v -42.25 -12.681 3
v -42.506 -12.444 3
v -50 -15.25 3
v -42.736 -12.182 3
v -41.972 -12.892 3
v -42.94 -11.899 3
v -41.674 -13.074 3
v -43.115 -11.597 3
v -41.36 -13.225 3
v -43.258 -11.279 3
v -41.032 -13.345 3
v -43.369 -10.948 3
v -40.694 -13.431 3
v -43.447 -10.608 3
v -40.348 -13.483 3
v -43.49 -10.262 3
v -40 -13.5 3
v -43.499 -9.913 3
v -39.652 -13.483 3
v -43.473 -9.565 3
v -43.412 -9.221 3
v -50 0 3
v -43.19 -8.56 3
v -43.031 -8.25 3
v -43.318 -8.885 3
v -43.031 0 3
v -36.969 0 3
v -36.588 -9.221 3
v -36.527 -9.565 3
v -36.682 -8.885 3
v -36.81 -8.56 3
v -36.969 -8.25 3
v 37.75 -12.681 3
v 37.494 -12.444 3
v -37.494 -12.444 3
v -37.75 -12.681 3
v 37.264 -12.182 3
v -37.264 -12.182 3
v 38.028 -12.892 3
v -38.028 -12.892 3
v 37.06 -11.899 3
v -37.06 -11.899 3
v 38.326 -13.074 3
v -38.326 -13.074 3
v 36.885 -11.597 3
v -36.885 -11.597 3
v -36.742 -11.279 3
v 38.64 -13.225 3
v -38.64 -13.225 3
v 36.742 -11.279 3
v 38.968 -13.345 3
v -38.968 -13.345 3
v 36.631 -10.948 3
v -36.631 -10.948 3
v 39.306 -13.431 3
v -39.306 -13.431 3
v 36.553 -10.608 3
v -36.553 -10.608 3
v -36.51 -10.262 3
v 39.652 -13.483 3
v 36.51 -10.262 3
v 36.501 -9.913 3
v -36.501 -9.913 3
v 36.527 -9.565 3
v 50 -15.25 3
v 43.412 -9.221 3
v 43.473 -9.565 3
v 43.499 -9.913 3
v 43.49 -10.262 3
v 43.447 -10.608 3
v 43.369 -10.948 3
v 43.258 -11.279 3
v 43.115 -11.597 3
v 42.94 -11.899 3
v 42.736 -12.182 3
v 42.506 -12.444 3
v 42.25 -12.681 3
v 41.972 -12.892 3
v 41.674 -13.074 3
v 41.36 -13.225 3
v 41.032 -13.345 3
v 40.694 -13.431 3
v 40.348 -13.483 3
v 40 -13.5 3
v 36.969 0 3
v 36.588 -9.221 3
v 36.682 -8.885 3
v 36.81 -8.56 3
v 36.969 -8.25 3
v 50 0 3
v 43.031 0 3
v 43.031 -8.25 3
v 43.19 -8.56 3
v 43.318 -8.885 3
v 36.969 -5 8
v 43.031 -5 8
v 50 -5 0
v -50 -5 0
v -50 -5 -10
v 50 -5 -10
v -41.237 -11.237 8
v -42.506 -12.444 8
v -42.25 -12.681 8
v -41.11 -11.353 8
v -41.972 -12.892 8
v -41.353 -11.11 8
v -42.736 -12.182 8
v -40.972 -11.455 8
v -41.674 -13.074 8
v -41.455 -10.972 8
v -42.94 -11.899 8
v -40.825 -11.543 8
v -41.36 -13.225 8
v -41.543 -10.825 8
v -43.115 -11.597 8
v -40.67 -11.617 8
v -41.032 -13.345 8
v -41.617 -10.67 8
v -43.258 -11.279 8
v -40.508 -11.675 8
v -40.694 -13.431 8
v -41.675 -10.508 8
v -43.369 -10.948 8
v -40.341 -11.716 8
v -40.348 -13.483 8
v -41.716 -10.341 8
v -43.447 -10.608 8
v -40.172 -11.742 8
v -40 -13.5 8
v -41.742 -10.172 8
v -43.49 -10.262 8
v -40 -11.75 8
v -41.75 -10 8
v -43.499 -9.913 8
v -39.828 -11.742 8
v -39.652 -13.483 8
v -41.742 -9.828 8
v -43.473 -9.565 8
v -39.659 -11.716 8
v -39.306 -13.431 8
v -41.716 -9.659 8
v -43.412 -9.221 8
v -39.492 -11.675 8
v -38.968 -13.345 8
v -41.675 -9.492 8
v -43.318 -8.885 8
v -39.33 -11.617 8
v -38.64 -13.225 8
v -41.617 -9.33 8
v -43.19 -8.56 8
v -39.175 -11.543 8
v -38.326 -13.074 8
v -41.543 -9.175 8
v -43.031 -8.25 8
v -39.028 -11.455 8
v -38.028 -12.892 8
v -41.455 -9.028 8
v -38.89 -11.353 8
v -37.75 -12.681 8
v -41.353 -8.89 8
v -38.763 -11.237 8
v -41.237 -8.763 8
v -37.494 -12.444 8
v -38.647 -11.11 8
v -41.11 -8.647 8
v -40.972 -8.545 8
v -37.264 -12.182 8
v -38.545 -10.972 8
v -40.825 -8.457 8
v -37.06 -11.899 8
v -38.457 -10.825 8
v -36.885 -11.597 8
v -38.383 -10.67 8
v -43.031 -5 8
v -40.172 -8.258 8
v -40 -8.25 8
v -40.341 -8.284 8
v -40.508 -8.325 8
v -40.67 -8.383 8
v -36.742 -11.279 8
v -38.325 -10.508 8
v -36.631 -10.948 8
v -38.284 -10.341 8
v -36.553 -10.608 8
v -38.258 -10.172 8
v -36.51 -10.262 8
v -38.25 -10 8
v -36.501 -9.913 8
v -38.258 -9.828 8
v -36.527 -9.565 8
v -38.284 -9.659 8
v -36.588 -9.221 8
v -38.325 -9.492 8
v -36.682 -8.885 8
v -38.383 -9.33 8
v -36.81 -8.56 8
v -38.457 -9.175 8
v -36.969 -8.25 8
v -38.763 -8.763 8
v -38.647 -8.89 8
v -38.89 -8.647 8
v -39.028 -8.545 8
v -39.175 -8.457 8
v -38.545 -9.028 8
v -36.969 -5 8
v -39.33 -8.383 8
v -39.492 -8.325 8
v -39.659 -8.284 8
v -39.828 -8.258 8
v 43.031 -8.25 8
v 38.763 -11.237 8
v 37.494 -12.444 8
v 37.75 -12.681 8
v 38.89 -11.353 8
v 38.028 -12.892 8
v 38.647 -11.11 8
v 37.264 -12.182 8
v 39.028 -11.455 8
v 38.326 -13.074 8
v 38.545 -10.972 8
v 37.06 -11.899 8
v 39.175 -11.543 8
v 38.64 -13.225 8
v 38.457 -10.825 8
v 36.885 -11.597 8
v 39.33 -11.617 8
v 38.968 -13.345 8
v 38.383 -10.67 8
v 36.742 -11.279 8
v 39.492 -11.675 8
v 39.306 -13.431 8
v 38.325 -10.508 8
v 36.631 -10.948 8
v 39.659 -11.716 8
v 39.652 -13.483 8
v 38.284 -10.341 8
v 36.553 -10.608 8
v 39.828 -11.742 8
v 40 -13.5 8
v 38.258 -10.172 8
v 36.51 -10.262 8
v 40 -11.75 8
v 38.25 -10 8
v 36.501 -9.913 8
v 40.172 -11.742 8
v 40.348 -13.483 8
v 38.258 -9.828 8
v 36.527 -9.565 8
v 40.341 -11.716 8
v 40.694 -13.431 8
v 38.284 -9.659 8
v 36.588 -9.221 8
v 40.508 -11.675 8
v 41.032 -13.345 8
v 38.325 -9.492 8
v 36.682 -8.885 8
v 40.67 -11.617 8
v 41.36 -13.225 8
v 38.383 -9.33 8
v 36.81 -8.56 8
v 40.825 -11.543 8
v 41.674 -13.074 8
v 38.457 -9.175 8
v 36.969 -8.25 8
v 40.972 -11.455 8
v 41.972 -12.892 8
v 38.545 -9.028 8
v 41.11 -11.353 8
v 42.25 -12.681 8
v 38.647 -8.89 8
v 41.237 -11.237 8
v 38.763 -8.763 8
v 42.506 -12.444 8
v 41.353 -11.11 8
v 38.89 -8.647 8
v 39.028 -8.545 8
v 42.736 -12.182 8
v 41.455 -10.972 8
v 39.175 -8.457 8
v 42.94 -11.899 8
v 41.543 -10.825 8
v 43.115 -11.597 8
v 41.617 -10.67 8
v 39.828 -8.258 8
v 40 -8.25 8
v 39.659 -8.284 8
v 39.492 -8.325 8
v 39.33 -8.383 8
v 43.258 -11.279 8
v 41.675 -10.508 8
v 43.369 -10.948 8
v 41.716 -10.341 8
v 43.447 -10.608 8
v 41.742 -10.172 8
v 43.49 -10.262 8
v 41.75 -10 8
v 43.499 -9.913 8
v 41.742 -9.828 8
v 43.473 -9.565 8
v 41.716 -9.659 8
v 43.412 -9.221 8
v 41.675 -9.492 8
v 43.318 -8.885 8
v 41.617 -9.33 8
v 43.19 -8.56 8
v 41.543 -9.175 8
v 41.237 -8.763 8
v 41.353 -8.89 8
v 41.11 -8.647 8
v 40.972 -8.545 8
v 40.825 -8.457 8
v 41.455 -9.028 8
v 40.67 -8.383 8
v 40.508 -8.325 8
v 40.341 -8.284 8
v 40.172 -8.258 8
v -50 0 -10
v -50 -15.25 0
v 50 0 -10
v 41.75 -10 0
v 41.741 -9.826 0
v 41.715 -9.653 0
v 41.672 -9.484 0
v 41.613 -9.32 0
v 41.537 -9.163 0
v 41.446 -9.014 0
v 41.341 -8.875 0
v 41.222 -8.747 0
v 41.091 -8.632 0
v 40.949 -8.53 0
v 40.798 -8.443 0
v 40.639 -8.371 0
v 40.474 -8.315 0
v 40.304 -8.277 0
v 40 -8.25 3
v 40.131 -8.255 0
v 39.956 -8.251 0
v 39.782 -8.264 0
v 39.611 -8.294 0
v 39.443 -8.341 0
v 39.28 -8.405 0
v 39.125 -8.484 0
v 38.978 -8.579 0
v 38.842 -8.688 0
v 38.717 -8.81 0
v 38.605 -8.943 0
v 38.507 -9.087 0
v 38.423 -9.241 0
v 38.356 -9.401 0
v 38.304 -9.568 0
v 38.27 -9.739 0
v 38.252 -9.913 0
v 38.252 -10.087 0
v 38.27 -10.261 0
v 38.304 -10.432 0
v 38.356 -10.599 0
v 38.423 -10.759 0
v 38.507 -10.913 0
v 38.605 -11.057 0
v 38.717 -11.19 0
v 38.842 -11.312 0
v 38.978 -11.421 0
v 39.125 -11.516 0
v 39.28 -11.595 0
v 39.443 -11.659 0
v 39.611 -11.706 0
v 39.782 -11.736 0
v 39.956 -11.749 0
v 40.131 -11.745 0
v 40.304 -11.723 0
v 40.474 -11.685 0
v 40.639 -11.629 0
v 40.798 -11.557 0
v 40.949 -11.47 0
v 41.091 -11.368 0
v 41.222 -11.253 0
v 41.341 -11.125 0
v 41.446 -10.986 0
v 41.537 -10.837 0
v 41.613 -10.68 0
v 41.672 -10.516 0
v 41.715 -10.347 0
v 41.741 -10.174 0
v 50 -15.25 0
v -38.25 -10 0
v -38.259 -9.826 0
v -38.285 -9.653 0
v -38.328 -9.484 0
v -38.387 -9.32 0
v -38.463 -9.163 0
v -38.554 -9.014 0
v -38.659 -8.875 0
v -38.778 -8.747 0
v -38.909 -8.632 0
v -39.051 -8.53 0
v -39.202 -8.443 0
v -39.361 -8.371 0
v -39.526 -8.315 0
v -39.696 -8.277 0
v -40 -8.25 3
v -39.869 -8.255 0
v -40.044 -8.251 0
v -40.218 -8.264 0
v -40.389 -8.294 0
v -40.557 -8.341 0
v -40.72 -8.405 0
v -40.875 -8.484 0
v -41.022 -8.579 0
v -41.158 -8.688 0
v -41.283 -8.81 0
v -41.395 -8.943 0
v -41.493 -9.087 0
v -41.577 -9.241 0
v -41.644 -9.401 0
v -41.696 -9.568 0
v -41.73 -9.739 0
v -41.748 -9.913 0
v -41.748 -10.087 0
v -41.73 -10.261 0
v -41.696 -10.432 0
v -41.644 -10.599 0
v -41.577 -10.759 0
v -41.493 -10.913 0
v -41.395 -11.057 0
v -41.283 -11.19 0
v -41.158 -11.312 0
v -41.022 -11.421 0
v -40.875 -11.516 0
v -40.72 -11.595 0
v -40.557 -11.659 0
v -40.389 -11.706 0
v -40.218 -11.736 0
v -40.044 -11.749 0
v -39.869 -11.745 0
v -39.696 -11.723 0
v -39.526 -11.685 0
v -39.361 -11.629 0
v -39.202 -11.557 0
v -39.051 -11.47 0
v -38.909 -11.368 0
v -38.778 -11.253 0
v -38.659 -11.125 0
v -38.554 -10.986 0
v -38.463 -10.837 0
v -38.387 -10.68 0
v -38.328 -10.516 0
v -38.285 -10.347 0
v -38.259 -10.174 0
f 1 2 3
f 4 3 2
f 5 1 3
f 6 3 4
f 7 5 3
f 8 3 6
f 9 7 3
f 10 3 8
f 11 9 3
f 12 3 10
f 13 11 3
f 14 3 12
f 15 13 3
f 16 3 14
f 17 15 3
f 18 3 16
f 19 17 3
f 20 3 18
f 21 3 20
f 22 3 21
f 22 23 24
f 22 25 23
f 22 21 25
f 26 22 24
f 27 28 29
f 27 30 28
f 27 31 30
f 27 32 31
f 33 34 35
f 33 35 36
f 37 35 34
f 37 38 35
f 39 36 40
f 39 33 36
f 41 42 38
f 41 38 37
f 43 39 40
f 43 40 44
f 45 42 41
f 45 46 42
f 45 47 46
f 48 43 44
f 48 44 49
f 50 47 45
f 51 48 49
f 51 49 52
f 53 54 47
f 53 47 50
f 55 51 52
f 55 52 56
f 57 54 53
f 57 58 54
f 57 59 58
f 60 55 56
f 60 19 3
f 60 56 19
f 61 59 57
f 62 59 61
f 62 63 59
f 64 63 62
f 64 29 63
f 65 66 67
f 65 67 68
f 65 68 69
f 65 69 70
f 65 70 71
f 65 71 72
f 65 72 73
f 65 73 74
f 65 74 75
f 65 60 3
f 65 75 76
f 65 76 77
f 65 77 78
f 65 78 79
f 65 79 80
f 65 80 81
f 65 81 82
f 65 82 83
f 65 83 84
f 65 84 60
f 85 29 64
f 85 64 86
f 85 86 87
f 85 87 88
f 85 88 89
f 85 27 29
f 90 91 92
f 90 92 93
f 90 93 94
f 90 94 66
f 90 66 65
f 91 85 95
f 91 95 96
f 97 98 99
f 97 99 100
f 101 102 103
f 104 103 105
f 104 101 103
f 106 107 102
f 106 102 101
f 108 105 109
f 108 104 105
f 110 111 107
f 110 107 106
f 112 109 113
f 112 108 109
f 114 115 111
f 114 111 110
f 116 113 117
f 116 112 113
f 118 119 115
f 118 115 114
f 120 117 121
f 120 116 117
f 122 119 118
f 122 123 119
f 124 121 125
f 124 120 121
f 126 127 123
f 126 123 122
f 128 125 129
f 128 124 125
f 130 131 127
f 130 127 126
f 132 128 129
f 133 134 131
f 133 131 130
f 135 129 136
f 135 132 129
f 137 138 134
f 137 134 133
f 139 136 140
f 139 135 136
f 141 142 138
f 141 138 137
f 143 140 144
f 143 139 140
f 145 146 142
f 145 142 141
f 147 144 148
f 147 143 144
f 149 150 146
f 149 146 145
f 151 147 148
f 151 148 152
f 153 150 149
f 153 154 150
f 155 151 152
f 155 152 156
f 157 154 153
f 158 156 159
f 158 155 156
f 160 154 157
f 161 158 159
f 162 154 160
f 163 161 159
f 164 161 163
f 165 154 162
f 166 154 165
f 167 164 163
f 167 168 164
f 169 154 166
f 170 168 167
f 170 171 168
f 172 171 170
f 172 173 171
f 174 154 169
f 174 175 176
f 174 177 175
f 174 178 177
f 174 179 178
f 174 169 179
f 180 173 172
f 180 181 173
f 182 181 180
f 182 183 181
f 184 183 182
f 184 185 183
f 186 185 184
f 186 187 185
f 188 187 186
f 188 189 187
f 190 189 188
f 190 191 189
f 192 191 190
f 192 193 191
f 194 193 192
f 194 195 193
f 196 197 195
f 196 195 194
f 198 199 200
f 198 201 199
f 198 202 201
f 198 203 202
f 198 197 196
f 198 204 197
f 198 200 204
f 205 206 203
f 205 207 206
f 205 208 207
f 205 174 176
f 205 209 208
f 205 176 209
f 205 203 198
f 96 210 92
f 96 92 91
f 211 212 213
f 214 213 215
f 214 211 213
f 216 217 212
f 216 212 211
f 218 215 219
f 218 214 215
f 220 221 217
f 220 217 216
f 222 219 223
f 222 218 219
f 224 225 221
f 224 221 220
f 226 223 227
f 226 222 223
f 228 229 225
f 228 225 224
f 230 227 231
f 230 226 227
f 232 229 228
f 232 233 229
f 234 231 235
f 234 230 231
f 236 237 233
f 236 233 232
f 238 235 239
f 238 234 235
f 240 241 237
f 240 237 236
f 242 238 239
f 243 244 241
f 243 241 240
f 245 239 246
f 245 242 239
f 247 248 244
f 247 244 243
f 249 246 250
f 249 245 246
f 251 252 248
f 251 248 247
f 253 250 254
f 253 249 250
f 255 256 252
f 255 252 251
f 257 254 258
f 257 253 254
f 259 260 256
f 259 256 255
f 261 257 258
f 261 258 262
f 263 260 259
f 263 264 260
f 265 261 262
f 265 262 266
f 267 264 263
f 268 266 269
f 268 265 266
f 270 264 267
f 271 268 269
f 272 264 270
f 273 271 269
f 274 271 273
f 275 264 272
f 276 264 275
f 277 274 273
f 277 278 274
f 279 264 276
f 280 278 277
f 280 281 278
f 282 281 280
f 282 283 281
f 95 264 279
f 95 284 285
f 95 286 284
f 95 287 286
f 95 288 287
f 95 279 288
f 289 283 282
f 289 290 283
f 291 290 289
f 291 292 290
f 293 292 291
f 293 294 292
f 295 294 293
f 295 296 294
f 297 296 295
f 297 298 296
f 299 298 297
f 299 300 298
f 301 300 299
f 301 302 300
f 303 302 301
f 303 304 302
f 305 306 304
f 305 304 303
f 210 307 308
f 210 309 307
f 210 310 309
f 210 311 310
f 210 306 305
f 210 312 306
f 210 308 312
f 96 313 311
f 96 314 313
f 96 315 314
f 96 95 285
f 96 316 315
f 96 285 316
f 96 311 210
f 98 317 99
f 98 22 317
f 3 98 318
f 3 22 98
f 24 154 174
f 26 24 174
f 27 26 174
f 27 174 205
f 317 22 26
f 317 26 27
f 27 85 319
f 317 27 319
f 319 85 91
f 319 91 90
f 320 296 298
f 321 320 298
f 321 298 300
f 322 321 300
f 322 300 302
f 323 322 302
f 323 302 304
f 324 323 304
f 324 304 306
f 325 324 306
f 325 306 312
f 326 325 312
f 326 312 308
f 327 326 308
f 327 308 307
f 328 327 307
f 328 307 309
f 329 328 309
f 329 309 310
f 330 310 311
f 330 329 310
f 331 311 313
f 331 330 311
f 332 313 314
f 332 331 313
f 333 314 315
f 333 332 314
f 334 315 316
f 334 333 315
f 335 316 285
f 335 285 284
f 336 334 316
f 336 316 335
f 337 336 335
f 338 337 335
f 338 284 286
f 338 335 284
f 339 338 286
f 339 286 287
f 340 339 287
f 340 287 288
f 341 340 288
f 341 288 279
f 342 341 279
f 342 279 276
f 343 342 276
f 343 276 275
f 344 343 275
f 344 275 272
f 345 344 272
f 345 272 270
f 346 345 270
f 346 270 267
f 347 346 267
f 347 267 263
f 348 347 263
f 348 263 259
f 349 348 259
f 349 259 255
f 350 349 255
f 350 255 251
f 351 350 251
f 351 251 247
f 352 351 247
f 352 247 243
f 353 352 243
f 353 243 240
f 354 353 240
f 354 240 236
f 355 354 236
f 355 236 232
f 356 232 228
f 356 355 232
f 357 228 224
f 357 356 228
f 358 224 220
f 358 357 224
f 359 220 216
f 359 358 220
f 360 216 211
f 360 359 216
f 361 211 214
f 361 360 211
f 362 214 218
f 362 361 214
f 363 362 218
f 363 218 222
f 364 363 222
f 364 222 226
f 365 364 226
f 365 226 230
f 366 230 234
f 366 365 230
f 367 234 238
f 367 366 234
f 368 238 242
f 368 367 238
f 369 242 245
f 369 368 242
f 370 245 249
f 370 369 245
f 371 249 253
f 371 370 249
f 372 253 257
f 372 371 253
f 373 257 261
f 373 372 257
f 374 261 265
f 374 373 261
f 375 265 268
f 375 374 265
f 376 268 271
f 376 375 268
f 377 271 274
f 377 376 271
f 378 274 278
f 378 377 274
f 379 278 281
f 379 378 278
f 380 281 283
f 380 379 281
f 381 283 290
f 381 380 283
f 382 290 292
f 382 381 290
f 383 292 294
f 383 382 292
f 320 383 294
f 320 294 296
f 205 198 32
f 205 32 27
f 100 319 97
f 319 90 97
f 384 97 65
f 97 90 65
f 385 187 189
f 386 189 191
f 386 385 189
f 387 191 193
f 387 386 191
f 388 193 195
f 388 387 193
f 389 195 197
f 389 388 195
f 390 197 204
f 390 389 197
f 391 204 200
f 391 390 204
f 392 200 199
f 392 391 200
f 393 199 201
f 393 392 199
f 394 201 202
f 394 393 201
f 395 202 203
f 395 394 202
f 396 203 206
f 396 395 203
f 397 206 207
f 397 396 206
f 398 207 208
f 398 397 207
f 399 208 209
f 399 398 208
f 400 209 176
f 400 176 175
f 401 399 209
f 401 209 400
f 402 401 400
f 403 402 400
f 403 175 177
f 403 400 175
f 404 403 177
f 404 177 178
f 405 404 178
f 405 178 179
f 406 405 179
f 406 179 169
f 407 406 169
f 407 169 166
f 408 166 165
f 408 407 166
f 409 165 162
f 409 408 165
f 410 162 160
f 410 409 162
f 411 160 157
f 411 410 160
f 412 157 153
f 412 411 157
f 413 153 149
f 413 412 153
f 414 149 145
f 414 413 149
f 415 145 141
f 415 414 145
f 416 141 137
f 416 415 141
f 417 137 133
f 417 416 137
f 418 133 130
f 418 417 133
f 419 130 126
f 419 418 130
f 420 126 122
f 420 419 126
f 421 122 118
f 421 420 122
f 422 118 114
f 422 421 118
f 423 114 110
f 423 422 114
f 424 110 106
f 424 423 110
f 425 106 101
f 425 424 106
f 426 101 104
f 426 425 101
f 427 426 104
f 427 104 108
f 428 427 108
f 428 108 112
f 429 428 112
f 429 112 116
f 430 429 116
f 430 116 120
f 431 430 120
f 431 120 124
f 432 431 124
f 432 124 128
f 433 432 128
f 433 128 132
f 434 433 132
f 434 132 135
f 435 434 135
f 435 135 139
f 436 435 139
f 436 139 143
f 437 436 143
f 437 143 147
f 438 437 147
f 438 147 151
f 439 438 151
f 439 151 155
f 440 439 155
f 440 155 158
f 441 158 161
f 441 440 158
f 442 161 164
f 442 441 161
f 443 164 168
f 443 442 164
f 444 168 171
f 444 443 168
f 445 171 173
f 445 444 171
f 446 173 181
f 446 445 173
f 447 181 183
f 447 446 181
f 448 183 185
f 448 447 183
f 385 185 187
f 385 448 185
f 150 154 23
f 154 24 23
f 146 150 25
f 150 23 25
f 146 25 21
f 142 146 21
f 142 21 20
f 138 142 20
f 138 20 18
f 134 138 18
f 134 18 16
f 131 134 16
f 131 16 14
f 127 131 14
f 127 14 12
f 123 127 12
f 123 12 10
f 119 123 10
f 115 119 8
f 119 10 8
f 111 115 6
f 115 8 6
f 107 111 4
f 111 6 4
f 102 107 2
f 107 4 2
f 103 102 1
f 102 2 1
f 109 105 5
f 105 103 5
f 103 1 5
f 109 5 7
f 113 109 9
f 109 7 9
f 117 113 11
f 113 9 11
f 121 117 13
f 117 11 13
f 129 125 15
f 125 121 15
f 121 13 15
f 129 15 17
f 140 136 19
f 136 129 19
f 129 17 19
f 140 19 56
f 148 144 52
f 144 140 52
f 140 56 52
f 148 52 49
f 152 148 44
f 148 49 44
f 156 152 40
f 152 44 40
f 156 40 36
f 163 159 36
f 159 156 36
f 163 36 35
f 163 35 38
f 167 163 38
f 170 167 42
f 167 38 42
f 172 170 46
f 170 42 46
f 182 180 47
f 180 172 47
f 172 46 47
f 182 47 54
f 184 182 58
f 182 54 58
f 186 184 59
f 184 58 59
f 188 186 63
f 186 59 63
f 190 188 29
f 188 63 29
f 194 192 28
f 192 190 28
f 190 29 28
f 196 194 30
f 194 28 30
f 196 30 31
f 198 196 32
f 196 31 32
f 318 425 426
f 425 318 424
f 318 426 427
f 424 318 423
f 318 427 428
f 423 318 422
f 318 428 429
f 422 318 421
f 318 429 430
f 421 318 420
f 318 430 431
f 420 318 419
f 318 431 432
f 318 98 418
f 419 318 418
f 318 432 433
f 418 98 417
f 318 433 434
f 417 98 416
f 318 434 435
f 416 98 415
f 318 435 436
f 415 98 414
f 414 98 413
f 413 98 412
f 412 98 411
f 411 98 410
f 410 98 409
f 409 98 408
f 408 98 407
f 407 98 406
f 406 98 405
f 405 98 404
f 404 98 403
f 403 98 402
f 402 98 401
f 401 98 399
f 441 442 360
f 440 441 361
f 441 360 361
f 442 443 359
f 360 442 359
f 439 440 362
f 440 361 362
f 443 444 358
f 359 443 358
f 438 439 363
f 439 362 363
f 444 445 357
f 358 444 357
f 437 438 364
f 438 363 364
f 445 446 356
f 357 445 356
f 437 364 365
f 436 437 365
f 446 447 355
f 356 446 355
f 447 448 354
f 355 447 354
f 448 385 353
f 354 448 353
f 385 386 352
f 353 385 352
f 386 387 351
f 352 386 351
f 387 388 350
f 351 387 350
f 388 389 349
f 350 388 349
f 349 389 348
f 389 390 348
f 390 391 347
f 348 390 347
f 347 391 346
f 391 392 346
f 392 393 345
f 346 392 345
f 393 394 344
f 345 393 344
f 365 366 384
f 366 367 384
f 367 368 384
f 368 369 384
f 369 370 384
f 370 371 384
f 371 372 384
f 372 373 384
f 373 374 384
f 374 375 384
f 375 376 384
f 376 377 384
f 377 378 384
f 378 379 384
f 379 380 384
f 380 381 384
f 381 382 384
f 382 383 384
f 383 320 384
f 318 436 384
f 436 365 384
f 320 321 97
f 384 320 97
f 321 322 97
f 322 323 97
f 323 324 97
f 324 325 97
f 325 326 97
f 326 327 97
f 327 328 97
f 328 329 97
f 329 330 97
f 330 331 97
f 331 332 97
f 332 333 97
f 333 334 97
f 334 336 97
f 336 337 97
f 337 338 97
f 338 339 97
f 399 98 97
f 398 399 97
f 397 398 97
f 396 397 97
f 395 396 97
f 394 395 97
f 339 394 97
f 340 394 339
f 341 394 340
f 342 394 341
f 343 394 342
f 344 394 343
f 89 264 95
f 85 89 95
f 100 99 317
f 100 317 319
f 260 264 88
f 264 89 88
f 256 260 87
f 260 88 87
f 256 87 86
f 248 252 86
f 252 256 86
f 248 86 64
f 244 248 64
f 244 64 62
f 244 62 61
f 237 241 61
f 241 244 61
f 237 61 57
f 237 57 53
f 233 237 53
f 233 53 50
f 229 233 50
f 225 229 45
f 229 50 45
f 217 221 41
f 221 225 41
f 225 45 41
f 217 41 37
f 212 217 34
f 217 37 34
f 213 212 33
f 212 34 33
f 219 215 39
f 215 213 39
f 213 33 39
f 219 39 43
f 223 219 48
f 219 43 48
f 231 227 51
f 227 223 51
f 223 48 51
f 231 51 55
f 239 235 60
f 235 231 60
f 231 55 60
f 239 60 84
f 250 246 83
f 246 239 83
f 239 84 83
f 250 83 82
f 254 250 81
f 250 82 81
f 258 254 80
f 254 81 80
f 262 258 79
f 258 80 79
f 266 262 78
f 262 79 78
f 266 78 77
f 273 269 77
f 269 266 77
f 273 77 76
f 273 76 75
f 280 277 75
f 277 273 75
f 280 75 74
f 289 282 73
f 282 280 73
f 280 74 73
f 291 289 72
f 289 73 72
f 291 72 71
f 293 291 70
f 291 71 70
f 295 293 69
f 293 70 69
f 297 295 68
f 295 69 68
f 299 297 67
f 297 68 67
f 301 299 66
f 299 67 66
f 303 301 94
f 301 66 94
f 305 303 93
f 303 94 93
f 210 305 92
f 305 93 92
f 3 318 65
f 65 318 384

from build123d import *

# Parameters (mm, degrees)
SKETCH_W      = 100
SKETCH_H      = 15.25
SKETCH_R      = 1.75
PAD_DEPTH     = 3
SKETCH001_W   = 100
SKETCH001_H   = 5
PAD001_DEPTH  = 10
SKETCH002_R   = 3.5
SKETCH002_R_2 = 1.75
PAD002_DEPTH  = 5
SKETCH003_W   = 6.062178
SKETCH003_H   = 8.25
PAD003_DEPTH  = 5
CHAMFER_SIZE  = 5


with BuildPart() as part:
    # Sketch → Pad (new body)
    with BuildSketch(Plane.XY):
        with Locations((0, -7.625)):
            Rectangle(SKETCH_W, SKETCH_H)
        with Locations((-40, -10)):
            Circle(SKETCH_R, mode=Mode.SUBTRACT)
        with Locations((40, -10)):
            Circle(SKETCH_R, mode=Mode.SUBTRACT)
    extrude(amount=PAD_DEPTH)

    # Sketch001 (on Face7 of Pad) → Pad001 (join)
    with BuildSketch(Plane(origin=(0, 0, 0), x_dir=(1, 0, 0), z_dir=(0, 0, -1))):
        with Locations((0, 2.5)):
            Rectangle(SKETCH001_W, SKETCH001_H)
    extrude(amount=PAD001_DEPTH)

    # Sketch002 (on Face5 of Pad001) → Pad002 (join)
    with BuildSketch(Plane.XY.offset(3)):
        with Locations((-40, -10)):
            Circle(SKETCH002_R)
        with Locations((-40, -10)):
            Circle(SKETCH002_R_2, mode=Mode.SUBTRACT)
        with Locations((40, -10)):
            Circle(SKETCH002_R)
        with Locations((40, -10)):
            Circle(SKETCH002_R_2, mode=Mode.SUBTRACT)
    extrude(amount=PAD002_DEPTH)

    # Sketch003 (on Face17 of Pad002) → Pad003 (join)
    with BuildSketch(Plane.XY.offset(8)):
        with Locations((-40, -4.125)):
            Rectangle(SKETCH003_W, SKETCH003_H)
        with Locations((40, -4.125)):
            Rectangle(SKETCH003_W, SKETCH003_H)
    extrude(amount=-PAD003_DEPTH)

    # Chamfer
    chamfer_edges = [part.edges().sort_by_distance(p)[0] for p in [
        (-40, 0, 8),
        (40, 0, 8),
    ]]
    chamfer(chamfer_edges, length=CHAMFER_SIZE)


solid = part.part
